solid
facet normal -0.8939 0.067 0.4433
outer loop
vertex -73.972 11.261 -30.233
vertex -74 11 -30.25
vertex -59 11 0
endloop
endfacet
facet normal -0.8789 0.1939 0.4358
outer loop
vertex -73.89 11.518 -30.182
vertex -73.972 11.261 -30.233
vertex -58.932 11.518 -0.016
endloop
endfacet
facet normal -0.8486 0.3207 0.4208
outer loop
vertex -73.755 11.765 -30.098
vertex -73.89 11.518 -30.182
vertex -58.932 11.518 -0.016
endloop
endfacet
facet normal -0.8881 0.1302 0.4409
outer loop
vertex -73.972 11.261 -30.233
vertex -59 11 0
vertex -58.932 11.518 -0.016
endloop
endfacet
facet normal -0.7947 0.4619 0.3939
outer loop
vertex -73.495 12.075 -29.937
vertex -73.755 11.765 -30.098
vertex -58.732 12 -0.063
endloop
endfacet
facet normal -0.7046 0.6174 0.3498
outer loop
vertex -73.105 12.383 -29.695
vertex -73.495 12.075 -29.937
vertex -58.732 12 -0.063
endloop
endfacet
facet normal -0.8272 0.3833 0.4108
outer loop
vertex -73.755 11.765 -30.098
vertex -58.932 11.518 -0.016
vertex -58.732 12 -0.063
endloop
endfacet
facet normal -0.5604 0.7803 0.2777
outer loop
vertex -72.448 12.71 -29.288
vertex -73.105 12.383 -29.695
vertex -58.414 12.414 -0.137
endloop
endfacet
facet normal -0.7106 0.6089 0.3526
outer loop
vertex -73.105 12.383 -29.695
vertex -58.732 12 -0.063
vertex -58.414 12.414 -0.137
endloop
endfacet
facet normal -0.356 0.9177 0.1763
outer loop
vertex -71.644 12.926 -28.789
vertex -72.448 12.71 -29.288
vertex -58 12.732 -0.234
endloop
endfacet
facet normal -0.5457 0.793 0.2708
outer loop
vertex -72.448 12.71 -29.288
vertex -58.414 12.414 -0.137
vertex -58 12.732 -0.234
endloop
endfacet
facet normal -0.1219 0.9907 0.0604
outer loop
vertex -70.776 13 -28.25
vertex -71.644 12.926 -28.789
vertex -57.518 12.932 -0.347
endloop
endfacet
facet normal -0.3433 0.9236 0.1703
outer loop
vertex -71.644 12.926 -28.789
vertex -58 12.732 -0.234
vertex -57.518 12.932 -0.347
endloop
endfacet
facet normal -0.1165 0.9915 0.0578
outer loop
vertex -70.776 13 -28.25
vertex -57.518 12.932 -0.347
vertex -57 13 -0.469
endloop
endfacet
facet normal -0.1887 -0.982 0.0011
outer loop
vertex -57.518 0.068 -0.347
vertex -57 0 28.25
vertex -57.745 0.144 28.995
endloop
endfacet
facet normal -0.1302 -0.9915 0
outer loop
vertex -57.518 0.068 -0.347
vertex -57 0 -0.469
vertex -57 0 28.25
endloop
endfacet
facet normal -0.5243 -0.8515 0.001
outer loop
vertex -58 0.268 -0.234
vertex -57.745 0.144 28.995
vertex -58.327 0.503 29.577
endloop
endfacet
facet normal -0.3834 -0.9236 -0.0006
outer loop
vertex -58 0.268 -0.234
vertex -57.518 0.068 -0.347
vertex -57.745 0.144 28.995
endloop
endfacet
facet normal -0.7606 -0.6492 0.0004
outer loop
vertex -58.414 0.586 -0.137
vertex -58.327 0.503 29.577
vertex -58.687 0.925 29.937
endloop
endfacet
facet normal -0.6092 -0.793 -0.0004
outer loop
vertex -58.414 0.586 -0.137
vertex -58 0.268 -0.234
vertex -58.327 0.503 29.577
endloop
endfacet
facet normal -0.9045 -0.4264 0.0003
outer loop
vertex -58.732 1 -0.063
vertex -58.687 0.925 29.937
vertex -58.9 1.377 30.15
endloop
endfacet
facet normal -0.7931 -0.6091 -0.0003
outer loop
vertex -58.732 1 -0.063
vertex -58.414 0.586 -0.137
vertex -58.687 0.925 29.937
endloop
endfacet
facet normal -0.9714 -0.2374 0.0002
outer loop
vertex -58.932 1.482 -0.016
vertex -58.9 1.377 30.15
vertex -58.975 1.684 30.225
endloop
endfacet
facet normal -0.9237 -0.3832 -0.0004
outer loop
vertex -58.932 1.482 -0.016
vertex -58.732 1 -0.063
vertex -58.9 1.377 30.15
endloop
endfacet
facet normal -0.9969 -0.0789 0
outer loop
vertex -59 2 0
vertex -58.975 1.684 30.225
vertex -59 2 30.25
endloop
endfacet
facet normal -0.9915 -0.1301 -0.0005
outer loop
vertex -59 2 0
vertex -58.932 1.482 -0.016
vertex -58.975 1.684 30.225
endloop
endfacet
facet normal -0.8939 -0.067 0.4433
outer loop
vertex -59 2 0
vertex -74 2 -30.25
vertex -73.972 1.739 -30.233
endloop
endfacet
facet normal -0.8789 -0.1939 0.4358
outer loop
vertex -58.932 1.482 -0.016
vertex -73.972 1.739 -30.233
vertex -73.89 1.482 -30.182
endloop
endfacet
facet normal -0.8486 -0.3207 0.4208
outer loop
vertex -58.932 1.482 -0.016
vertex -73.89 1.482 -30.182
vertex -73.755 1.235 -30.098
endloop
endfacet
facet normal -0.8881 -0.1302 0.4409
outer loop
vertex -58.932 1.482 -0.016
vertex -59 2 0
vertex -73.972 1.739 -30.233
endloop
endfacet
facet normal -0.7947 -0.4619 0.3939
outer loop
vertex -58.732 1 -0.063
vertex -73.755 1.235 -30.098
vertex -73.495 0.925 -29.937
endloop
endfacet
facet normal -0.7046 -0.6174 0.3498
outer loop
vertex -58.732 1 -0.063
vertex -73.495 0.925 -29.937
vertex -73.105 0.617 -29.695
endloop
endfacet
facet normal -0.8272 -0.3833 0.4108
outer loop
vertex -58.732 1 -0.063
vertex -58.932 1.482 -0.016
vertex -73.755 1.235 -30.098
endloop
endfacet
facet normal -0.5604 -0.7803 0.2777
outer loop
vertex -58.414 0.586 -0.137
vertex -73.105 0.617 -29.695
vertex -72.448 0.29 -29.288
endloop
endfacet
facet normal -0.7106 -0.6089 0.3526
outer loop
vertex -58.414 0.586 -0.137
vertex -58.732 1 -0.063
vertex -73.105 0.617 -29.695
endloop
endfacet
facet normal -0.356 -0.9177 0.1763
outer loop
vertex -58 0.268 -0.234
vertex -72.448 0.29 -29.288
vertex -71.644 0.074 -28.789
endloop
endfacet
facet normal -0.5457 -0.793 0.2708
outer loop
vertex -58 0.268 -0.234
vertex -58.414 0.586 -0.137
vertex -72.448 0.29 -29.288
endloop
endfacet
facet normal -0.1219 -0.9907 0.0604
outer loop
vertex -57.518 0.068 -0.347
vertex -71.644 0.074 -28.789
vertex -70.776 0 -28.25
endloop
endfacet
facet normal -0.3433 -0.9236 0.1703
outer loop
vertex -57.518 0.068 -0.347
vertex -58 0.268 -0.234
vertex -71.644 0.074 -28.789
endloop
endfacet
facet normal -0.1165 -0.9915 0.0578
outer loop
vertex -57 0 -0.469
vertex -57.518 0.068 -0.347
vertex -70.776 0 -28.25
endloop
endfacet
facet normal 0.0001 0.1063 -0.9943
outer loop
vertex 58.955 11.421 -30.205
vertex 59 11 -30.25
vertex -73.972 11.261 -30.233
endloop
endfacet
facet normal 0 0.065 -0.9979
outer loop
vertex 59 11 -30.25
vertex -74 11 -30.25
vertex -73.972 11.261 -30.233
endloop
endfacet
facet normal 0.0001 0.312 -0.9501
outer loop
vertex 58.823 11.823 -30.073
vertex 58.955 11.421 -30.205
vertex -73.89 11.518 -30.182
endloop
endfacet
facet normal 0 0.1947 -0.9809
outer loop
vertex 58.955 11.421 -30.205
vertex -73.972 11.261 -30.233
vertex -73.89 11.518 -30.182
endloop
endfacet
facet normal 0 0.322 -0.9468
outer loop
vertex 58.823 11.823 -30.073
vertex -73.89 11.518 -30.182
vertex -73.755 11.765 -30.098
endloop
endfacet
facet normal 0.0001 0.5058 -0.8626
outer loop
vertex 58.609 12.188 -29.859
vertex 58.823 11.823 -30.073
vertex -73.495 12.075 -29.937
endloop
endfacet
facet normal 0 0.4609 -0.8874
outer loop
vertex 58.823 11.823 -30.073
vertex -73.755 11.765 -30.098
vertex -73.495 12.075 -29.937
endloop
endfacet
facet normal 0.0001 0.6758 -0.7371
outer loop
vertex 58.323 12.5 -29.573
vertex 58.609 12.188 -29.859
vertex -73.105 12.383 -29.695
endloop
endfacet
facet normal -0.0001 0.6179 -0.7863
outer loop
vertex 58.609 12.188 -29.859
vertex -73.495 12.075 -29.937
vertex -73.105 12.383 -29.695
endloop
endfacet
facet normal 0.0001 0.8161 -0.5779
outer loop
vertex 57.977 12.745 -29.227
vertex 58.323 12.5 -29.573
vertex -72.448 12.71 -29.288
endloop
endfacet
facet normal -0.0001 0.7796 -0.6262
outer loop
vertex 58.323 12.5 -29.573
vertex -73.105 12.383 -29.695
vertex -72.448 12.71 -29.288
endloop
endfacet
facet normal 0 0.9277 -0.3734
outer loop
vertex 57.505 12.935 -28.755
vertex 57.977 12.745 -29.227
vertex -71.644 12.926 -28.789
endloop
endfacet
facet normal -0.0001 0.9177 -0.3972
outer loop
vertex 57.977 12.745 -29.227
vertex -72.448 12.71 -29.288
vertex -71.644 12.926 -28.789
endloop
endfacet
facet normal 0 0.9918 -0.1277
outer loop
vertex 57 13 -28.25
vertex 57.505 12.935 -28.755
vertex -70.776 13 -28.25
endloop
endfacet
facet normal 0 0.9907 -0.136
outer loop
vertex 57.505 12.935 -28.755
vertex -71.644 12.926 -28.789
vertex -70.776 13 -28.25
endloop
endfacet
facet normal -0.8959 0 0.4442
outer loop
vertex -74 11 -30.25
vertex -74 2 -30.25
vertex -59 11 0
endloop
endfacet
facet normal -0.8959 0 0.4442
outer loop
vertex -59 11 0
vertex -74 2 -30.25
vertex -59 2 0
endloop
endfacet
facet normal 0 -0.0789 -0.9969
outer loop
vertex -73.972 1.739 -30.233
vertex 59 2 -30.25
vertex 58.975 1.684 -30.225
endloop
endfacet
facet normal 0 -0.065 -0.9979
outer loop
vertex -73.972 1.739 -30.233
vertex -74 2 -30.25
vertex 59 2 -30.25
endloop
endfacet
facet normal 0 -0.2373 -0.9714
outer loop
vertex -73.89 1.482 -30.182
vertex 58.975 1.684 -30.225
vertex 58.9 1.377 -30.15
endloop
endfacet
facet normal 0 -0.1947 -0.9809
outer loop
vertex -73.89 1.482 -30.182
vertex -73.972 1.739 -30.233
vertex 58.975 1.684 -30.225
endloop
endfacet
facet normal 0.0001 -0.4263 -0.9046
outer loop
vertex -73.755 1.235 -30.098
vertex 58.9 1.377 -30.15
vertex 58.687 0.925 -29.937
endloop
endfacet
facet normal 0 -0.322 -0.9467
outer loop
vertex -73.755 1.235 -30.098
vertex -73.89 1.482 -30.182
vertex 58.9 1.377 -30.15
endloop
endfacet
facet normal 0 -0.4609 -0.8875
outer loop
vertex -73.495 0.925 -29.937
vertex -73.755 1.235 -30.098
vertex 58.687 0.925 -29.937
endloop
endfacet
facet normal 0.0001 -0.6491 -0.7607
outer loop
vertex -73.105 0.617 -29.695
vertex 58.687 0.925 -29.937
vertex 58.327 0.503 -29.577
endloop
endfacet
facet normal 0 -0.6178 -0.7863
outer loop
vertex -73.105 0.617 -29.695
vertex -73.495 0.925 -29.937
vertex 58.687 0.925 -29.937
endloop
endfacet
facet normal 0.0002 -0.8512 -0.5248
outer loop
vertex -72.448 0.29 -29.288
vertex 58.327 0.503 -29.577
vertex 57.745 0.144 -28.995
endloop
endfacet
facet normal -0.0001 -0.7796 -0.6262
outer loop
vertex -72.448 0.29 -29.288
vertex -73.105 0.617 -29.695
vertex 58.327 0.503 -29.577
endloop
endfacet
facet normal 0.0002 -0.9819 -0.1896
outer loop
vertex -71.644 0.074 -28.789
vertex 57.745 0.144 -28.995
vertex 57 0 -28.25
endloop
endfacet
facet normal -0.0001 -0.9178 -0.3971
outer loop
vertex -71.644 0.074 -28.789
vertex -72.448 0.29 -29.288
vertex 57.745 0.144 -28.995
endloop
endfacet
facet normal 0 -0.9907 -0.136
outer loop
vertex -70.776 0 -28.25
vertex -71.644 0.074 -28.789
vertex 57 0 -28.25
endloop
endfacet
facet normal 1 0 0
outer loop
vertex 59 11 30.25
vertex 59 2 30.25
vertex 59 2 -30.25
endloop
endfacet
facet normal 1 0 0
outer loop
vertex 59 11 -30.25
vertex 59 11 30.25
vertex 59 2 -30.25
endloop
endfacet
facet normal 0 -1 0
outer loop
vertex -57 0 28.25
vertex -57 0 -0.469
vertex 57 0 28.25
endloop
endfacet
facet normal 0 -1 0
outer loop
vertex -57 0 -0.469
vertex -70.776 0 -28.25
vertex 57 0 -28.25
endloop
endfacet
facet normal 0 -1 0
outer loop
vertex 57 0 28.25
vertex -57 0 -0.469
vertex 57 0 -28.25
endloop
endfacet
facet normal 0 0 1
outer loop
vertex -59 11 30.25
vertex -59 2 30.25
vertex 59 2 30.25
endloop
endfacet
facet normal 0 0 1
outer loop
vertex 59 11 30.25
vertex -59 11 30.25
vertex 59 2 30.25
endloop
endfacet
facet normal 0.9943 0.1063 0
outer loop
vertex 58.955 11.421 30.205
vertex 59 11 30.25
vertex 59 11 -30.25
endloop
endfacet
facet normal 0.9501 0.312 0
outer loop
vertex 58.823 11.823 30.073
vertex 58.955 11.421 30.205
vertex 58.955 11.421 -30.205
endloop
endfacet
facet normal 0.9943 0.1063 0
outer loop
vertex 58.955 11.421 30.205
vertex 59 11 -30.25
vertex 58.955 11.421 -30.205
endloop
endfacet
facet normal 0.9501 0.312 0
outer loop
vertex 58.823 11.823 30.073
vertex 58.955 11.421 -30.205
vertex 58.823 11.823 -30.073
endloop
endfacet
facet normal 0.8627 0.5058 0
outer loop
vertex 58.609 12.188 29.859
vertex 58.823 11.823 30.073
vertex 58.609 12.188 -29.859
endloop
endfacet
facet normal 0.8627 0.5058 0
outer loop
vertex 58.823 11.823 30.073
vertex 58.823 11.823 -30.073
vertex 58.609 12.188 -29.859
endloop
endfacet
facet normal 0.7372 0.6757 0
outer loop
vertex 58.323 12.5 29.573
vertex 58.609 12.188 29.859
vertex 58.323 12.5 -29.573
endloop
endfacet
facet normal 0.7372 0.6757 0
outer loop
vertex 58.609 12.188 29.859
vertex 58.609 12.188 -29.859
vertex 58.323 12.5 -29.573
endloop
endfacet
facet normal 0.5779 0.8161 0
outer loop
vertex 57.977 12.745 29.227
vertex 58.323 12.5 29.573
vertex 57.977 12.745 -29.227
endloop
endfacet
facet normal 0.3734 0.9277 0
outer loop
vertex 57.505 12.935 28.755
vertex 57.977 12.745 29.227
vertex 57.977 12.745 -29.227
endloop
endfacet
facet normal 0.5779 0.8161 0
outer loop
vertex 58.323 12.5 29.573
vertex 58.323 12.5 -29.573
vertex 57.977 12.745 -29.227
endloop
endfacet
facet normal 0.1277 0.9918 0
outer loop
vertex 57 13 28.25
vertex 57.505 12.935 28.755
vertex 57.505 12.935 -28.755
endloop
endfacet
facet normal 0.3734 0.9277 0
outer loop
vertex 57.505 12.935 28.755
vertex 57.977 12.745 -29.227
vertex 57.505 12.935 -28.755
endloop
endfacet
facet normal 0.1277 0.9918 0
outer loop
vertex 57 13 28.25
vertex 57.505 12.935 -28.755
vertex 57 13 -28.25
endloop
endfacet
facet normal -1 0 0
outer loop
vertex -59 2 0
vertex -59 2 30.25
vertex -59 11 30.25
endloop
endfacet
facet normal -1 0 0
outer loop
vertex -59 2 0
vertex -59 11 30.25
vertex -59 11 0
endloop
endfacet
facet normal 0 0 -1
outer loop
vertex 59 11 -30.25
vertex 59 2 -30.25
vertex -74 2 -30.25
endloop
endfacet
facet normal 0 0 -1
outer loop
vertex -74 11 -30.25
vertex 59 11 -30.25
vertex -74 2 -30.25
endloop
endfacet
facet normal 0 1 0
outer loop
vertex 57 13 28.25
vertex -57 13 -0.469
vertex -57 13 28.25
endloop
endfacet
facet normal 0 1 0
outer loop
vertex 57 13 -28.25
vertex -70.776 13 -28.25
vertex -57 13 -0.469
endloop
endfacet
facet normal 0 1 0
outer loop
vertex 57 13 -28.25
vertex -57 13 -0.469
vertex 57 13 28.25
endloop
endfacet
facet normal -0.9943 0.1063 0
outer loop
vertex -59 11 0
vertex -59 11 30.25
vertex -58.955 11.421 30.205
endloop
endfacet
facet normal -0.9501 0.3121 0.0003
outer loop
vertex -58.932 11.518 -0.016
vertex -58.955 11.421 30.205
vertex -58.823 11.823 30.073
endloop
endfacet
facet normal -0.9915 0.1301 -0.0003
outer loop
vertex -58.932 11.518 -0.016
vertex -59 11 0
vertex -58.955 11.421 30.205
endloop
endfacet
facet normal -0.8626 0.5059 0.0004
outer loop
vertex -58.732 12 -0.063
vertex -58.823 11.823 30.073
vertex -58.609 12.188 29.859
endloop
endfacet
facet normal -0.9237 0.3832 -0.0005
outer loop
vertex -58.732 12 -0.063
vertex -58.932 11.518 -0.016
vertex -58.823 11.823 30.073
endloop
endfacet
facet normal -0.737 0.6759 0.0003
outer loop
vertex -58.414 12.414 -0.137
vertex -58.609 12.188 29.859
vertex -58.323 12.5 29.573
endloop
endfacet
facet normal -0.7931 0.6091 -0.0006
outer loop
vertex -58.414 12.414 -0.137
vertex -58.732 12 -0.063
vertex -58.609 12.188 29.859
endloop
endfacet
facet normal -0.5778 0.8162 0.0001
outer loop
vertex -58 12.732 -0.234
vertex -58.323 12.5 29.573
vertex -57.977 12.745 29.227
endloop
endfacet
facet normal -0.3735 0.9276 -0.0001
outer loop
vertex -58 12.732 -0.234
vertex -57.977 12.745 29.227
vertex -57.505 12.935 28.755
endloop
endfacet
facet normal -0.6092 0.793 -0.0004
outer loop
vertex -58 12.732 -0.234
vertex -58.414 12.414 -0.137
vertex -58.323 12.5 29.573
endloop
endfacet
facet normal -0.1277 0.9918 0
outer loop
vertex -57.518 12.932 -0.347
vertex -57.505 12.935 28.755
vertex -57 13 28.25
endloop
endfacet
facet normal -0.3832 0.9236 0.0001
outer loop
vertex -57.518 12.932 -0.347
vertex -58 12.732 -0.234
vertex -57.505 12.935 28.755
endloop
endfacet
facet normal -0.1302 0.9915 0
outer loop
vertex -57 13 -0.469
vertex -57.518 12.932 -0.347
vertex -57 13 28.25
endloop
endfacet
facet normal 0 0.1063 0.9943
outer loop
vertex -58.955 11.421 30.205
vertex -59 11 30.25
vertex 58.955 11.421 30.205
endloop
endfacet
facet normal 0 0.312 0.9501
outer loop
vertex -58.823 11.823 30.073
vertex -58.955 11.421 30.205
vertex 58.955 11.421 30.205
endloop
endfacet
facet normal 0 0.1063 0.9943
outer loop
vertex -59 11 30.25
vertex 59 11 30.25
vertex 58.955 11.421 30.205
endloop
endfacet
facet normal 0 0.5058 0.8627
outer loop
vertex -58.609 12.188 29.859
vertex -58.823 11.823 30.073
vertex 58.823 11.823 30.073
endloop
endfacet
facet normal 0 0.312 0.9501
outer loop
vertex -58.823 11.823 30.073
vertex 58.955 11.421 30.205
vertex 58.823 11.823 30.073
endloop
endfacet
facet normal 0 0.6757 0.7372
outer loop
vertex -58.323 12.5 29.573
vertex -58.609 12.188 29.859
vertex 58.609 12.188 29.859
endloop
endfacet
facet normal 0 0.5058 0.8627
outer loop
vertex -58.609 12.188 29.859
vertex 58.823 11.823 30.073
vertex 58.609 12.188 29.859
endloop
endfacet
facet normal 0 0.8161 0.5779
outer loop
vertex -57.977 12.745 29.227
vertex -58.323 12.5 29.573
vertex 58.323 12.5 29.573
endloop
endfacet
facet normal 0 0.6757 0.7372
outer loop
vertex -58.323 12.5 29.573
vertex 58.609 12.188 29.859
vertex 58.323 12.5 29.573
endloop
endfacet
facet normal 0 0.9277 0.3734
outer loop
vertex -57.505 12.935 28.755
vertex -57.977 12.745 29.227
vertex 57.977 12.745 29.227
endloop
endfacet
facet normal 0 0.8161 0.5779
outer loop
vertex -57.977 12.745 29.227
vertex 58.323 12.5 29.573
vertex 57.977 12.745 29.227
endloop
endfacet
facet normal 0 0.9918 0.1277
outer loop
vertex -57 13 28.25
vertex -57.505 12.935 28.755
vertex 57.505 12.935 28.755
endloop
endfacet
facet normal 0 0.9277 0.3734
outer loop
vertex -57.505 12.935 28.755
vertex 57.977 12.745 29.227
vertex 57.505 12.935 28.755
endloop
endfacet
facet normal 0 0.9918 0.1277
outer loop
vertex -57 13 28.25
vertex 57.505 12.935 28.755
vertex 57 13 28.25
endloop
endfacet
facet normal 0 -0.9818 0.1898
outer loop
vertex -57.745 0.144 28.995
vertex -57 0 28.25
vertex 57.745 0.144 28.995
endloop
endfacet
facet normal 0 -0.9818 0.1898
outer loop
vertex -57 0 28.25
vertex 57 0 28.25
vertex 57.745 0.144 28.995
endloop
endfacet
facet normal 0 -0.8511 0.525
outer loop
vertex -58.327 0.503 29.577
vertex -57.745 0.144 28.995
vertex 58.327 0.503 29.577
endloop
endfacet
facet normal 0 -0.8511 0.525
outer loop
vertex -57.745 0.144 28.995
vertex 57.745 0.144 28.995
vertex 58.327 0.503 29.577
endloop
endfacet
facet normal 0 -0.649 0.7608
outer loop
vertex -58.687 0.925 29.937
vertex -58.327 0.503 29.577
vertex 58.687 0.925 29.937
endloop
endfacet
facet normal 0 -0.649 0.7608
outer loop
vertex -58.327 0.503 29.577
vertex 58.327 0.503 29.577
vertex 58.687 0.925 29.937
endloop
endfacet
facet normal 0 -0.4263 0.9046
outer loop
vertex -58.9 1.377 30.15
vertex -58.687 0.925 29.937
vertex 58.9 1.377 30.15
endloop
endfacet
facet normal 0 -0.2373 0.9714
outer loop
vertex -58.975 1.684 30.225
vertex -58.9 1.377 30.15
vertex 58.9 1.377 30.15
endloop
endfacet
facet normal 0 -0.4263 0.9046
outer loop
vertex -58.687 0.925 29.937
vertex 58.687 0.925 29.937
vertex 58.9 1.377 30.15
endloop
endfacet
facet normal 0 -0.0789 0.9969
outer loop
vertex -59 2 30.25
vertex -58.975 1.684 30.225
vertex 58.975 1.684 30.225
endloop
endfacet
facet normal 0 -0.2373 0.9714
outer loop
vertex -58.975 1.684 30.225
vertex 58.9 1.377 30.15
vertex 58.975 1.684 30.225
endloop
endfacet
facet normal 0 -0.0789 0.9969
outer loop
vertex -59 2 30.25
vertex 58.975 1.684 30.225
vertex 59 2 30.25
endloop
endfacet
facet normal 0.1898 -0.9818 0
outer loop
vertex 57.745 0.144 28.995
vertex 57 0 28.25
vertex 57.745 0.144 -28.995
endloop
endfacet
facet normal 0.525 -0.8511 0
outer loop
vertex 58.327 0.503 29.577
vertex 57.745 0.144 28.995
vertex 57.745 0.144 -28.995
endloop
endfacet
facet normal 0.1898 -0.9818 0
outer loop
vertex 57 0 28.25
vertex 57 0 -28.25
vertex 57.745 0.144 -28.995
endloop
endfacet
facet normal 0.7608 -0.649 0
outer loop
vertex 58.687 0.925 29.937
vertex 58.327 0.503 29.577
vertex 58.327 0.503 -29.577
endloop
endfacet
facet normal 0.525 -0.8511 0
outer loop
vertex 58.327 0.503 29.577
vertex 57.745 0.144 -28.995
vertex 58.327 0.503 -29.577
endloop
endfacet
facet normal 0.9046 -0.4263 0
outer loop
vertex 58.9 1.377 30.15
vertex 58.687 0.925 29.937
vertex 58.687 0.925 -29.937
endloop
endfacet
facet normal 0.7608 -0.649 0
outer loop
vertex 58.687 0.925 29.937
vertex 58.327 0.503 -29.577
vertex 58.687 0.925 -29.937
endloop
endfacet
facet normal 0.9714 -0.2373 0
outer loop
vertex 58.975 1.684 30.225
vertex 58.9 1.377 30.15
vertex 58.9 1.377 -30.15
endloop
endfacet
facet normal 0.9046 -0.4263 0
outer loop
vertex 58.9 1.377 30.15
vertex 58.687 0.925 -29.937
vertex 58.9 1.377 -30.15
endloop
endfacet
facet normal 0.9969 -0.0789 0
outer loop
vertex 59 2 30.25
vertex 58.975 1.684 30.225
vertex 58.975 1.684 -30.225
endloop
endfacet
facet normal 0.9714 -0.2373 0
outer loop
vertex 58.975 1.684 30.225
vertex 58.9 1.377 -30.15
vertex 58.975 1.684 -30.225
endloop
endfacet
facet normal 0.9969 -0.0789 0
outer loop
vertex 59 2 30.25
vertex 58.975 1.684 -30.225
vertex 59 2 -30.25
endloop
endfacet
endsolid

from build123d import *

# Parameters (mm, degrees)
SKETCH_1_W      = 118
SKETCH_1_H      = 60.5
EXTRUDE_1_DEPTH = 13
FILLET_1_R      = 2
FILLET_2_R      = 2


with BuildPart() as part:
    # 草图1 → 凸台-拉伸1 (new body)
    with BuildSketch(Plane(origin=(0, 0, 0), x_dir=(1, 0, 0), z_dir=(0, 1, 0))):
        Polygon((-59, 0), (-59, 30.25), (-74, 30.25), align=None)
        Rectangle(SKETCH_1_W, SKETCH_1_H)
    extrude(amount=EXTRUDE_1_DEPTH)

    # 圆角1
    fillet_1_edges = [part.edges().sort_by_distance(p)[0] for p in [
        (-66.5, 13, -15.125),
        (-59, 13, 15.125),
        (0, 13, 30.25),
        (59, 13, 0),
        (-7.5, 13, -30.25),
    ]]
    fillet(fillet_1_edges, radius=FILLET_1_R)

    # 圆角2
    fillet_2_edges = [part.edges().sort_by_distance(p)[0] for p in [
        (59, 0, 0),
        (0, 0, 30.25),
        (-59, 0, 15.125),
        (-66.5, 0, -15.125),
        (-7.5, 0, -30.25),
    ]]
    fillet(fillet_2_edges, radius=FILLET_2_R)


solid = part.part
